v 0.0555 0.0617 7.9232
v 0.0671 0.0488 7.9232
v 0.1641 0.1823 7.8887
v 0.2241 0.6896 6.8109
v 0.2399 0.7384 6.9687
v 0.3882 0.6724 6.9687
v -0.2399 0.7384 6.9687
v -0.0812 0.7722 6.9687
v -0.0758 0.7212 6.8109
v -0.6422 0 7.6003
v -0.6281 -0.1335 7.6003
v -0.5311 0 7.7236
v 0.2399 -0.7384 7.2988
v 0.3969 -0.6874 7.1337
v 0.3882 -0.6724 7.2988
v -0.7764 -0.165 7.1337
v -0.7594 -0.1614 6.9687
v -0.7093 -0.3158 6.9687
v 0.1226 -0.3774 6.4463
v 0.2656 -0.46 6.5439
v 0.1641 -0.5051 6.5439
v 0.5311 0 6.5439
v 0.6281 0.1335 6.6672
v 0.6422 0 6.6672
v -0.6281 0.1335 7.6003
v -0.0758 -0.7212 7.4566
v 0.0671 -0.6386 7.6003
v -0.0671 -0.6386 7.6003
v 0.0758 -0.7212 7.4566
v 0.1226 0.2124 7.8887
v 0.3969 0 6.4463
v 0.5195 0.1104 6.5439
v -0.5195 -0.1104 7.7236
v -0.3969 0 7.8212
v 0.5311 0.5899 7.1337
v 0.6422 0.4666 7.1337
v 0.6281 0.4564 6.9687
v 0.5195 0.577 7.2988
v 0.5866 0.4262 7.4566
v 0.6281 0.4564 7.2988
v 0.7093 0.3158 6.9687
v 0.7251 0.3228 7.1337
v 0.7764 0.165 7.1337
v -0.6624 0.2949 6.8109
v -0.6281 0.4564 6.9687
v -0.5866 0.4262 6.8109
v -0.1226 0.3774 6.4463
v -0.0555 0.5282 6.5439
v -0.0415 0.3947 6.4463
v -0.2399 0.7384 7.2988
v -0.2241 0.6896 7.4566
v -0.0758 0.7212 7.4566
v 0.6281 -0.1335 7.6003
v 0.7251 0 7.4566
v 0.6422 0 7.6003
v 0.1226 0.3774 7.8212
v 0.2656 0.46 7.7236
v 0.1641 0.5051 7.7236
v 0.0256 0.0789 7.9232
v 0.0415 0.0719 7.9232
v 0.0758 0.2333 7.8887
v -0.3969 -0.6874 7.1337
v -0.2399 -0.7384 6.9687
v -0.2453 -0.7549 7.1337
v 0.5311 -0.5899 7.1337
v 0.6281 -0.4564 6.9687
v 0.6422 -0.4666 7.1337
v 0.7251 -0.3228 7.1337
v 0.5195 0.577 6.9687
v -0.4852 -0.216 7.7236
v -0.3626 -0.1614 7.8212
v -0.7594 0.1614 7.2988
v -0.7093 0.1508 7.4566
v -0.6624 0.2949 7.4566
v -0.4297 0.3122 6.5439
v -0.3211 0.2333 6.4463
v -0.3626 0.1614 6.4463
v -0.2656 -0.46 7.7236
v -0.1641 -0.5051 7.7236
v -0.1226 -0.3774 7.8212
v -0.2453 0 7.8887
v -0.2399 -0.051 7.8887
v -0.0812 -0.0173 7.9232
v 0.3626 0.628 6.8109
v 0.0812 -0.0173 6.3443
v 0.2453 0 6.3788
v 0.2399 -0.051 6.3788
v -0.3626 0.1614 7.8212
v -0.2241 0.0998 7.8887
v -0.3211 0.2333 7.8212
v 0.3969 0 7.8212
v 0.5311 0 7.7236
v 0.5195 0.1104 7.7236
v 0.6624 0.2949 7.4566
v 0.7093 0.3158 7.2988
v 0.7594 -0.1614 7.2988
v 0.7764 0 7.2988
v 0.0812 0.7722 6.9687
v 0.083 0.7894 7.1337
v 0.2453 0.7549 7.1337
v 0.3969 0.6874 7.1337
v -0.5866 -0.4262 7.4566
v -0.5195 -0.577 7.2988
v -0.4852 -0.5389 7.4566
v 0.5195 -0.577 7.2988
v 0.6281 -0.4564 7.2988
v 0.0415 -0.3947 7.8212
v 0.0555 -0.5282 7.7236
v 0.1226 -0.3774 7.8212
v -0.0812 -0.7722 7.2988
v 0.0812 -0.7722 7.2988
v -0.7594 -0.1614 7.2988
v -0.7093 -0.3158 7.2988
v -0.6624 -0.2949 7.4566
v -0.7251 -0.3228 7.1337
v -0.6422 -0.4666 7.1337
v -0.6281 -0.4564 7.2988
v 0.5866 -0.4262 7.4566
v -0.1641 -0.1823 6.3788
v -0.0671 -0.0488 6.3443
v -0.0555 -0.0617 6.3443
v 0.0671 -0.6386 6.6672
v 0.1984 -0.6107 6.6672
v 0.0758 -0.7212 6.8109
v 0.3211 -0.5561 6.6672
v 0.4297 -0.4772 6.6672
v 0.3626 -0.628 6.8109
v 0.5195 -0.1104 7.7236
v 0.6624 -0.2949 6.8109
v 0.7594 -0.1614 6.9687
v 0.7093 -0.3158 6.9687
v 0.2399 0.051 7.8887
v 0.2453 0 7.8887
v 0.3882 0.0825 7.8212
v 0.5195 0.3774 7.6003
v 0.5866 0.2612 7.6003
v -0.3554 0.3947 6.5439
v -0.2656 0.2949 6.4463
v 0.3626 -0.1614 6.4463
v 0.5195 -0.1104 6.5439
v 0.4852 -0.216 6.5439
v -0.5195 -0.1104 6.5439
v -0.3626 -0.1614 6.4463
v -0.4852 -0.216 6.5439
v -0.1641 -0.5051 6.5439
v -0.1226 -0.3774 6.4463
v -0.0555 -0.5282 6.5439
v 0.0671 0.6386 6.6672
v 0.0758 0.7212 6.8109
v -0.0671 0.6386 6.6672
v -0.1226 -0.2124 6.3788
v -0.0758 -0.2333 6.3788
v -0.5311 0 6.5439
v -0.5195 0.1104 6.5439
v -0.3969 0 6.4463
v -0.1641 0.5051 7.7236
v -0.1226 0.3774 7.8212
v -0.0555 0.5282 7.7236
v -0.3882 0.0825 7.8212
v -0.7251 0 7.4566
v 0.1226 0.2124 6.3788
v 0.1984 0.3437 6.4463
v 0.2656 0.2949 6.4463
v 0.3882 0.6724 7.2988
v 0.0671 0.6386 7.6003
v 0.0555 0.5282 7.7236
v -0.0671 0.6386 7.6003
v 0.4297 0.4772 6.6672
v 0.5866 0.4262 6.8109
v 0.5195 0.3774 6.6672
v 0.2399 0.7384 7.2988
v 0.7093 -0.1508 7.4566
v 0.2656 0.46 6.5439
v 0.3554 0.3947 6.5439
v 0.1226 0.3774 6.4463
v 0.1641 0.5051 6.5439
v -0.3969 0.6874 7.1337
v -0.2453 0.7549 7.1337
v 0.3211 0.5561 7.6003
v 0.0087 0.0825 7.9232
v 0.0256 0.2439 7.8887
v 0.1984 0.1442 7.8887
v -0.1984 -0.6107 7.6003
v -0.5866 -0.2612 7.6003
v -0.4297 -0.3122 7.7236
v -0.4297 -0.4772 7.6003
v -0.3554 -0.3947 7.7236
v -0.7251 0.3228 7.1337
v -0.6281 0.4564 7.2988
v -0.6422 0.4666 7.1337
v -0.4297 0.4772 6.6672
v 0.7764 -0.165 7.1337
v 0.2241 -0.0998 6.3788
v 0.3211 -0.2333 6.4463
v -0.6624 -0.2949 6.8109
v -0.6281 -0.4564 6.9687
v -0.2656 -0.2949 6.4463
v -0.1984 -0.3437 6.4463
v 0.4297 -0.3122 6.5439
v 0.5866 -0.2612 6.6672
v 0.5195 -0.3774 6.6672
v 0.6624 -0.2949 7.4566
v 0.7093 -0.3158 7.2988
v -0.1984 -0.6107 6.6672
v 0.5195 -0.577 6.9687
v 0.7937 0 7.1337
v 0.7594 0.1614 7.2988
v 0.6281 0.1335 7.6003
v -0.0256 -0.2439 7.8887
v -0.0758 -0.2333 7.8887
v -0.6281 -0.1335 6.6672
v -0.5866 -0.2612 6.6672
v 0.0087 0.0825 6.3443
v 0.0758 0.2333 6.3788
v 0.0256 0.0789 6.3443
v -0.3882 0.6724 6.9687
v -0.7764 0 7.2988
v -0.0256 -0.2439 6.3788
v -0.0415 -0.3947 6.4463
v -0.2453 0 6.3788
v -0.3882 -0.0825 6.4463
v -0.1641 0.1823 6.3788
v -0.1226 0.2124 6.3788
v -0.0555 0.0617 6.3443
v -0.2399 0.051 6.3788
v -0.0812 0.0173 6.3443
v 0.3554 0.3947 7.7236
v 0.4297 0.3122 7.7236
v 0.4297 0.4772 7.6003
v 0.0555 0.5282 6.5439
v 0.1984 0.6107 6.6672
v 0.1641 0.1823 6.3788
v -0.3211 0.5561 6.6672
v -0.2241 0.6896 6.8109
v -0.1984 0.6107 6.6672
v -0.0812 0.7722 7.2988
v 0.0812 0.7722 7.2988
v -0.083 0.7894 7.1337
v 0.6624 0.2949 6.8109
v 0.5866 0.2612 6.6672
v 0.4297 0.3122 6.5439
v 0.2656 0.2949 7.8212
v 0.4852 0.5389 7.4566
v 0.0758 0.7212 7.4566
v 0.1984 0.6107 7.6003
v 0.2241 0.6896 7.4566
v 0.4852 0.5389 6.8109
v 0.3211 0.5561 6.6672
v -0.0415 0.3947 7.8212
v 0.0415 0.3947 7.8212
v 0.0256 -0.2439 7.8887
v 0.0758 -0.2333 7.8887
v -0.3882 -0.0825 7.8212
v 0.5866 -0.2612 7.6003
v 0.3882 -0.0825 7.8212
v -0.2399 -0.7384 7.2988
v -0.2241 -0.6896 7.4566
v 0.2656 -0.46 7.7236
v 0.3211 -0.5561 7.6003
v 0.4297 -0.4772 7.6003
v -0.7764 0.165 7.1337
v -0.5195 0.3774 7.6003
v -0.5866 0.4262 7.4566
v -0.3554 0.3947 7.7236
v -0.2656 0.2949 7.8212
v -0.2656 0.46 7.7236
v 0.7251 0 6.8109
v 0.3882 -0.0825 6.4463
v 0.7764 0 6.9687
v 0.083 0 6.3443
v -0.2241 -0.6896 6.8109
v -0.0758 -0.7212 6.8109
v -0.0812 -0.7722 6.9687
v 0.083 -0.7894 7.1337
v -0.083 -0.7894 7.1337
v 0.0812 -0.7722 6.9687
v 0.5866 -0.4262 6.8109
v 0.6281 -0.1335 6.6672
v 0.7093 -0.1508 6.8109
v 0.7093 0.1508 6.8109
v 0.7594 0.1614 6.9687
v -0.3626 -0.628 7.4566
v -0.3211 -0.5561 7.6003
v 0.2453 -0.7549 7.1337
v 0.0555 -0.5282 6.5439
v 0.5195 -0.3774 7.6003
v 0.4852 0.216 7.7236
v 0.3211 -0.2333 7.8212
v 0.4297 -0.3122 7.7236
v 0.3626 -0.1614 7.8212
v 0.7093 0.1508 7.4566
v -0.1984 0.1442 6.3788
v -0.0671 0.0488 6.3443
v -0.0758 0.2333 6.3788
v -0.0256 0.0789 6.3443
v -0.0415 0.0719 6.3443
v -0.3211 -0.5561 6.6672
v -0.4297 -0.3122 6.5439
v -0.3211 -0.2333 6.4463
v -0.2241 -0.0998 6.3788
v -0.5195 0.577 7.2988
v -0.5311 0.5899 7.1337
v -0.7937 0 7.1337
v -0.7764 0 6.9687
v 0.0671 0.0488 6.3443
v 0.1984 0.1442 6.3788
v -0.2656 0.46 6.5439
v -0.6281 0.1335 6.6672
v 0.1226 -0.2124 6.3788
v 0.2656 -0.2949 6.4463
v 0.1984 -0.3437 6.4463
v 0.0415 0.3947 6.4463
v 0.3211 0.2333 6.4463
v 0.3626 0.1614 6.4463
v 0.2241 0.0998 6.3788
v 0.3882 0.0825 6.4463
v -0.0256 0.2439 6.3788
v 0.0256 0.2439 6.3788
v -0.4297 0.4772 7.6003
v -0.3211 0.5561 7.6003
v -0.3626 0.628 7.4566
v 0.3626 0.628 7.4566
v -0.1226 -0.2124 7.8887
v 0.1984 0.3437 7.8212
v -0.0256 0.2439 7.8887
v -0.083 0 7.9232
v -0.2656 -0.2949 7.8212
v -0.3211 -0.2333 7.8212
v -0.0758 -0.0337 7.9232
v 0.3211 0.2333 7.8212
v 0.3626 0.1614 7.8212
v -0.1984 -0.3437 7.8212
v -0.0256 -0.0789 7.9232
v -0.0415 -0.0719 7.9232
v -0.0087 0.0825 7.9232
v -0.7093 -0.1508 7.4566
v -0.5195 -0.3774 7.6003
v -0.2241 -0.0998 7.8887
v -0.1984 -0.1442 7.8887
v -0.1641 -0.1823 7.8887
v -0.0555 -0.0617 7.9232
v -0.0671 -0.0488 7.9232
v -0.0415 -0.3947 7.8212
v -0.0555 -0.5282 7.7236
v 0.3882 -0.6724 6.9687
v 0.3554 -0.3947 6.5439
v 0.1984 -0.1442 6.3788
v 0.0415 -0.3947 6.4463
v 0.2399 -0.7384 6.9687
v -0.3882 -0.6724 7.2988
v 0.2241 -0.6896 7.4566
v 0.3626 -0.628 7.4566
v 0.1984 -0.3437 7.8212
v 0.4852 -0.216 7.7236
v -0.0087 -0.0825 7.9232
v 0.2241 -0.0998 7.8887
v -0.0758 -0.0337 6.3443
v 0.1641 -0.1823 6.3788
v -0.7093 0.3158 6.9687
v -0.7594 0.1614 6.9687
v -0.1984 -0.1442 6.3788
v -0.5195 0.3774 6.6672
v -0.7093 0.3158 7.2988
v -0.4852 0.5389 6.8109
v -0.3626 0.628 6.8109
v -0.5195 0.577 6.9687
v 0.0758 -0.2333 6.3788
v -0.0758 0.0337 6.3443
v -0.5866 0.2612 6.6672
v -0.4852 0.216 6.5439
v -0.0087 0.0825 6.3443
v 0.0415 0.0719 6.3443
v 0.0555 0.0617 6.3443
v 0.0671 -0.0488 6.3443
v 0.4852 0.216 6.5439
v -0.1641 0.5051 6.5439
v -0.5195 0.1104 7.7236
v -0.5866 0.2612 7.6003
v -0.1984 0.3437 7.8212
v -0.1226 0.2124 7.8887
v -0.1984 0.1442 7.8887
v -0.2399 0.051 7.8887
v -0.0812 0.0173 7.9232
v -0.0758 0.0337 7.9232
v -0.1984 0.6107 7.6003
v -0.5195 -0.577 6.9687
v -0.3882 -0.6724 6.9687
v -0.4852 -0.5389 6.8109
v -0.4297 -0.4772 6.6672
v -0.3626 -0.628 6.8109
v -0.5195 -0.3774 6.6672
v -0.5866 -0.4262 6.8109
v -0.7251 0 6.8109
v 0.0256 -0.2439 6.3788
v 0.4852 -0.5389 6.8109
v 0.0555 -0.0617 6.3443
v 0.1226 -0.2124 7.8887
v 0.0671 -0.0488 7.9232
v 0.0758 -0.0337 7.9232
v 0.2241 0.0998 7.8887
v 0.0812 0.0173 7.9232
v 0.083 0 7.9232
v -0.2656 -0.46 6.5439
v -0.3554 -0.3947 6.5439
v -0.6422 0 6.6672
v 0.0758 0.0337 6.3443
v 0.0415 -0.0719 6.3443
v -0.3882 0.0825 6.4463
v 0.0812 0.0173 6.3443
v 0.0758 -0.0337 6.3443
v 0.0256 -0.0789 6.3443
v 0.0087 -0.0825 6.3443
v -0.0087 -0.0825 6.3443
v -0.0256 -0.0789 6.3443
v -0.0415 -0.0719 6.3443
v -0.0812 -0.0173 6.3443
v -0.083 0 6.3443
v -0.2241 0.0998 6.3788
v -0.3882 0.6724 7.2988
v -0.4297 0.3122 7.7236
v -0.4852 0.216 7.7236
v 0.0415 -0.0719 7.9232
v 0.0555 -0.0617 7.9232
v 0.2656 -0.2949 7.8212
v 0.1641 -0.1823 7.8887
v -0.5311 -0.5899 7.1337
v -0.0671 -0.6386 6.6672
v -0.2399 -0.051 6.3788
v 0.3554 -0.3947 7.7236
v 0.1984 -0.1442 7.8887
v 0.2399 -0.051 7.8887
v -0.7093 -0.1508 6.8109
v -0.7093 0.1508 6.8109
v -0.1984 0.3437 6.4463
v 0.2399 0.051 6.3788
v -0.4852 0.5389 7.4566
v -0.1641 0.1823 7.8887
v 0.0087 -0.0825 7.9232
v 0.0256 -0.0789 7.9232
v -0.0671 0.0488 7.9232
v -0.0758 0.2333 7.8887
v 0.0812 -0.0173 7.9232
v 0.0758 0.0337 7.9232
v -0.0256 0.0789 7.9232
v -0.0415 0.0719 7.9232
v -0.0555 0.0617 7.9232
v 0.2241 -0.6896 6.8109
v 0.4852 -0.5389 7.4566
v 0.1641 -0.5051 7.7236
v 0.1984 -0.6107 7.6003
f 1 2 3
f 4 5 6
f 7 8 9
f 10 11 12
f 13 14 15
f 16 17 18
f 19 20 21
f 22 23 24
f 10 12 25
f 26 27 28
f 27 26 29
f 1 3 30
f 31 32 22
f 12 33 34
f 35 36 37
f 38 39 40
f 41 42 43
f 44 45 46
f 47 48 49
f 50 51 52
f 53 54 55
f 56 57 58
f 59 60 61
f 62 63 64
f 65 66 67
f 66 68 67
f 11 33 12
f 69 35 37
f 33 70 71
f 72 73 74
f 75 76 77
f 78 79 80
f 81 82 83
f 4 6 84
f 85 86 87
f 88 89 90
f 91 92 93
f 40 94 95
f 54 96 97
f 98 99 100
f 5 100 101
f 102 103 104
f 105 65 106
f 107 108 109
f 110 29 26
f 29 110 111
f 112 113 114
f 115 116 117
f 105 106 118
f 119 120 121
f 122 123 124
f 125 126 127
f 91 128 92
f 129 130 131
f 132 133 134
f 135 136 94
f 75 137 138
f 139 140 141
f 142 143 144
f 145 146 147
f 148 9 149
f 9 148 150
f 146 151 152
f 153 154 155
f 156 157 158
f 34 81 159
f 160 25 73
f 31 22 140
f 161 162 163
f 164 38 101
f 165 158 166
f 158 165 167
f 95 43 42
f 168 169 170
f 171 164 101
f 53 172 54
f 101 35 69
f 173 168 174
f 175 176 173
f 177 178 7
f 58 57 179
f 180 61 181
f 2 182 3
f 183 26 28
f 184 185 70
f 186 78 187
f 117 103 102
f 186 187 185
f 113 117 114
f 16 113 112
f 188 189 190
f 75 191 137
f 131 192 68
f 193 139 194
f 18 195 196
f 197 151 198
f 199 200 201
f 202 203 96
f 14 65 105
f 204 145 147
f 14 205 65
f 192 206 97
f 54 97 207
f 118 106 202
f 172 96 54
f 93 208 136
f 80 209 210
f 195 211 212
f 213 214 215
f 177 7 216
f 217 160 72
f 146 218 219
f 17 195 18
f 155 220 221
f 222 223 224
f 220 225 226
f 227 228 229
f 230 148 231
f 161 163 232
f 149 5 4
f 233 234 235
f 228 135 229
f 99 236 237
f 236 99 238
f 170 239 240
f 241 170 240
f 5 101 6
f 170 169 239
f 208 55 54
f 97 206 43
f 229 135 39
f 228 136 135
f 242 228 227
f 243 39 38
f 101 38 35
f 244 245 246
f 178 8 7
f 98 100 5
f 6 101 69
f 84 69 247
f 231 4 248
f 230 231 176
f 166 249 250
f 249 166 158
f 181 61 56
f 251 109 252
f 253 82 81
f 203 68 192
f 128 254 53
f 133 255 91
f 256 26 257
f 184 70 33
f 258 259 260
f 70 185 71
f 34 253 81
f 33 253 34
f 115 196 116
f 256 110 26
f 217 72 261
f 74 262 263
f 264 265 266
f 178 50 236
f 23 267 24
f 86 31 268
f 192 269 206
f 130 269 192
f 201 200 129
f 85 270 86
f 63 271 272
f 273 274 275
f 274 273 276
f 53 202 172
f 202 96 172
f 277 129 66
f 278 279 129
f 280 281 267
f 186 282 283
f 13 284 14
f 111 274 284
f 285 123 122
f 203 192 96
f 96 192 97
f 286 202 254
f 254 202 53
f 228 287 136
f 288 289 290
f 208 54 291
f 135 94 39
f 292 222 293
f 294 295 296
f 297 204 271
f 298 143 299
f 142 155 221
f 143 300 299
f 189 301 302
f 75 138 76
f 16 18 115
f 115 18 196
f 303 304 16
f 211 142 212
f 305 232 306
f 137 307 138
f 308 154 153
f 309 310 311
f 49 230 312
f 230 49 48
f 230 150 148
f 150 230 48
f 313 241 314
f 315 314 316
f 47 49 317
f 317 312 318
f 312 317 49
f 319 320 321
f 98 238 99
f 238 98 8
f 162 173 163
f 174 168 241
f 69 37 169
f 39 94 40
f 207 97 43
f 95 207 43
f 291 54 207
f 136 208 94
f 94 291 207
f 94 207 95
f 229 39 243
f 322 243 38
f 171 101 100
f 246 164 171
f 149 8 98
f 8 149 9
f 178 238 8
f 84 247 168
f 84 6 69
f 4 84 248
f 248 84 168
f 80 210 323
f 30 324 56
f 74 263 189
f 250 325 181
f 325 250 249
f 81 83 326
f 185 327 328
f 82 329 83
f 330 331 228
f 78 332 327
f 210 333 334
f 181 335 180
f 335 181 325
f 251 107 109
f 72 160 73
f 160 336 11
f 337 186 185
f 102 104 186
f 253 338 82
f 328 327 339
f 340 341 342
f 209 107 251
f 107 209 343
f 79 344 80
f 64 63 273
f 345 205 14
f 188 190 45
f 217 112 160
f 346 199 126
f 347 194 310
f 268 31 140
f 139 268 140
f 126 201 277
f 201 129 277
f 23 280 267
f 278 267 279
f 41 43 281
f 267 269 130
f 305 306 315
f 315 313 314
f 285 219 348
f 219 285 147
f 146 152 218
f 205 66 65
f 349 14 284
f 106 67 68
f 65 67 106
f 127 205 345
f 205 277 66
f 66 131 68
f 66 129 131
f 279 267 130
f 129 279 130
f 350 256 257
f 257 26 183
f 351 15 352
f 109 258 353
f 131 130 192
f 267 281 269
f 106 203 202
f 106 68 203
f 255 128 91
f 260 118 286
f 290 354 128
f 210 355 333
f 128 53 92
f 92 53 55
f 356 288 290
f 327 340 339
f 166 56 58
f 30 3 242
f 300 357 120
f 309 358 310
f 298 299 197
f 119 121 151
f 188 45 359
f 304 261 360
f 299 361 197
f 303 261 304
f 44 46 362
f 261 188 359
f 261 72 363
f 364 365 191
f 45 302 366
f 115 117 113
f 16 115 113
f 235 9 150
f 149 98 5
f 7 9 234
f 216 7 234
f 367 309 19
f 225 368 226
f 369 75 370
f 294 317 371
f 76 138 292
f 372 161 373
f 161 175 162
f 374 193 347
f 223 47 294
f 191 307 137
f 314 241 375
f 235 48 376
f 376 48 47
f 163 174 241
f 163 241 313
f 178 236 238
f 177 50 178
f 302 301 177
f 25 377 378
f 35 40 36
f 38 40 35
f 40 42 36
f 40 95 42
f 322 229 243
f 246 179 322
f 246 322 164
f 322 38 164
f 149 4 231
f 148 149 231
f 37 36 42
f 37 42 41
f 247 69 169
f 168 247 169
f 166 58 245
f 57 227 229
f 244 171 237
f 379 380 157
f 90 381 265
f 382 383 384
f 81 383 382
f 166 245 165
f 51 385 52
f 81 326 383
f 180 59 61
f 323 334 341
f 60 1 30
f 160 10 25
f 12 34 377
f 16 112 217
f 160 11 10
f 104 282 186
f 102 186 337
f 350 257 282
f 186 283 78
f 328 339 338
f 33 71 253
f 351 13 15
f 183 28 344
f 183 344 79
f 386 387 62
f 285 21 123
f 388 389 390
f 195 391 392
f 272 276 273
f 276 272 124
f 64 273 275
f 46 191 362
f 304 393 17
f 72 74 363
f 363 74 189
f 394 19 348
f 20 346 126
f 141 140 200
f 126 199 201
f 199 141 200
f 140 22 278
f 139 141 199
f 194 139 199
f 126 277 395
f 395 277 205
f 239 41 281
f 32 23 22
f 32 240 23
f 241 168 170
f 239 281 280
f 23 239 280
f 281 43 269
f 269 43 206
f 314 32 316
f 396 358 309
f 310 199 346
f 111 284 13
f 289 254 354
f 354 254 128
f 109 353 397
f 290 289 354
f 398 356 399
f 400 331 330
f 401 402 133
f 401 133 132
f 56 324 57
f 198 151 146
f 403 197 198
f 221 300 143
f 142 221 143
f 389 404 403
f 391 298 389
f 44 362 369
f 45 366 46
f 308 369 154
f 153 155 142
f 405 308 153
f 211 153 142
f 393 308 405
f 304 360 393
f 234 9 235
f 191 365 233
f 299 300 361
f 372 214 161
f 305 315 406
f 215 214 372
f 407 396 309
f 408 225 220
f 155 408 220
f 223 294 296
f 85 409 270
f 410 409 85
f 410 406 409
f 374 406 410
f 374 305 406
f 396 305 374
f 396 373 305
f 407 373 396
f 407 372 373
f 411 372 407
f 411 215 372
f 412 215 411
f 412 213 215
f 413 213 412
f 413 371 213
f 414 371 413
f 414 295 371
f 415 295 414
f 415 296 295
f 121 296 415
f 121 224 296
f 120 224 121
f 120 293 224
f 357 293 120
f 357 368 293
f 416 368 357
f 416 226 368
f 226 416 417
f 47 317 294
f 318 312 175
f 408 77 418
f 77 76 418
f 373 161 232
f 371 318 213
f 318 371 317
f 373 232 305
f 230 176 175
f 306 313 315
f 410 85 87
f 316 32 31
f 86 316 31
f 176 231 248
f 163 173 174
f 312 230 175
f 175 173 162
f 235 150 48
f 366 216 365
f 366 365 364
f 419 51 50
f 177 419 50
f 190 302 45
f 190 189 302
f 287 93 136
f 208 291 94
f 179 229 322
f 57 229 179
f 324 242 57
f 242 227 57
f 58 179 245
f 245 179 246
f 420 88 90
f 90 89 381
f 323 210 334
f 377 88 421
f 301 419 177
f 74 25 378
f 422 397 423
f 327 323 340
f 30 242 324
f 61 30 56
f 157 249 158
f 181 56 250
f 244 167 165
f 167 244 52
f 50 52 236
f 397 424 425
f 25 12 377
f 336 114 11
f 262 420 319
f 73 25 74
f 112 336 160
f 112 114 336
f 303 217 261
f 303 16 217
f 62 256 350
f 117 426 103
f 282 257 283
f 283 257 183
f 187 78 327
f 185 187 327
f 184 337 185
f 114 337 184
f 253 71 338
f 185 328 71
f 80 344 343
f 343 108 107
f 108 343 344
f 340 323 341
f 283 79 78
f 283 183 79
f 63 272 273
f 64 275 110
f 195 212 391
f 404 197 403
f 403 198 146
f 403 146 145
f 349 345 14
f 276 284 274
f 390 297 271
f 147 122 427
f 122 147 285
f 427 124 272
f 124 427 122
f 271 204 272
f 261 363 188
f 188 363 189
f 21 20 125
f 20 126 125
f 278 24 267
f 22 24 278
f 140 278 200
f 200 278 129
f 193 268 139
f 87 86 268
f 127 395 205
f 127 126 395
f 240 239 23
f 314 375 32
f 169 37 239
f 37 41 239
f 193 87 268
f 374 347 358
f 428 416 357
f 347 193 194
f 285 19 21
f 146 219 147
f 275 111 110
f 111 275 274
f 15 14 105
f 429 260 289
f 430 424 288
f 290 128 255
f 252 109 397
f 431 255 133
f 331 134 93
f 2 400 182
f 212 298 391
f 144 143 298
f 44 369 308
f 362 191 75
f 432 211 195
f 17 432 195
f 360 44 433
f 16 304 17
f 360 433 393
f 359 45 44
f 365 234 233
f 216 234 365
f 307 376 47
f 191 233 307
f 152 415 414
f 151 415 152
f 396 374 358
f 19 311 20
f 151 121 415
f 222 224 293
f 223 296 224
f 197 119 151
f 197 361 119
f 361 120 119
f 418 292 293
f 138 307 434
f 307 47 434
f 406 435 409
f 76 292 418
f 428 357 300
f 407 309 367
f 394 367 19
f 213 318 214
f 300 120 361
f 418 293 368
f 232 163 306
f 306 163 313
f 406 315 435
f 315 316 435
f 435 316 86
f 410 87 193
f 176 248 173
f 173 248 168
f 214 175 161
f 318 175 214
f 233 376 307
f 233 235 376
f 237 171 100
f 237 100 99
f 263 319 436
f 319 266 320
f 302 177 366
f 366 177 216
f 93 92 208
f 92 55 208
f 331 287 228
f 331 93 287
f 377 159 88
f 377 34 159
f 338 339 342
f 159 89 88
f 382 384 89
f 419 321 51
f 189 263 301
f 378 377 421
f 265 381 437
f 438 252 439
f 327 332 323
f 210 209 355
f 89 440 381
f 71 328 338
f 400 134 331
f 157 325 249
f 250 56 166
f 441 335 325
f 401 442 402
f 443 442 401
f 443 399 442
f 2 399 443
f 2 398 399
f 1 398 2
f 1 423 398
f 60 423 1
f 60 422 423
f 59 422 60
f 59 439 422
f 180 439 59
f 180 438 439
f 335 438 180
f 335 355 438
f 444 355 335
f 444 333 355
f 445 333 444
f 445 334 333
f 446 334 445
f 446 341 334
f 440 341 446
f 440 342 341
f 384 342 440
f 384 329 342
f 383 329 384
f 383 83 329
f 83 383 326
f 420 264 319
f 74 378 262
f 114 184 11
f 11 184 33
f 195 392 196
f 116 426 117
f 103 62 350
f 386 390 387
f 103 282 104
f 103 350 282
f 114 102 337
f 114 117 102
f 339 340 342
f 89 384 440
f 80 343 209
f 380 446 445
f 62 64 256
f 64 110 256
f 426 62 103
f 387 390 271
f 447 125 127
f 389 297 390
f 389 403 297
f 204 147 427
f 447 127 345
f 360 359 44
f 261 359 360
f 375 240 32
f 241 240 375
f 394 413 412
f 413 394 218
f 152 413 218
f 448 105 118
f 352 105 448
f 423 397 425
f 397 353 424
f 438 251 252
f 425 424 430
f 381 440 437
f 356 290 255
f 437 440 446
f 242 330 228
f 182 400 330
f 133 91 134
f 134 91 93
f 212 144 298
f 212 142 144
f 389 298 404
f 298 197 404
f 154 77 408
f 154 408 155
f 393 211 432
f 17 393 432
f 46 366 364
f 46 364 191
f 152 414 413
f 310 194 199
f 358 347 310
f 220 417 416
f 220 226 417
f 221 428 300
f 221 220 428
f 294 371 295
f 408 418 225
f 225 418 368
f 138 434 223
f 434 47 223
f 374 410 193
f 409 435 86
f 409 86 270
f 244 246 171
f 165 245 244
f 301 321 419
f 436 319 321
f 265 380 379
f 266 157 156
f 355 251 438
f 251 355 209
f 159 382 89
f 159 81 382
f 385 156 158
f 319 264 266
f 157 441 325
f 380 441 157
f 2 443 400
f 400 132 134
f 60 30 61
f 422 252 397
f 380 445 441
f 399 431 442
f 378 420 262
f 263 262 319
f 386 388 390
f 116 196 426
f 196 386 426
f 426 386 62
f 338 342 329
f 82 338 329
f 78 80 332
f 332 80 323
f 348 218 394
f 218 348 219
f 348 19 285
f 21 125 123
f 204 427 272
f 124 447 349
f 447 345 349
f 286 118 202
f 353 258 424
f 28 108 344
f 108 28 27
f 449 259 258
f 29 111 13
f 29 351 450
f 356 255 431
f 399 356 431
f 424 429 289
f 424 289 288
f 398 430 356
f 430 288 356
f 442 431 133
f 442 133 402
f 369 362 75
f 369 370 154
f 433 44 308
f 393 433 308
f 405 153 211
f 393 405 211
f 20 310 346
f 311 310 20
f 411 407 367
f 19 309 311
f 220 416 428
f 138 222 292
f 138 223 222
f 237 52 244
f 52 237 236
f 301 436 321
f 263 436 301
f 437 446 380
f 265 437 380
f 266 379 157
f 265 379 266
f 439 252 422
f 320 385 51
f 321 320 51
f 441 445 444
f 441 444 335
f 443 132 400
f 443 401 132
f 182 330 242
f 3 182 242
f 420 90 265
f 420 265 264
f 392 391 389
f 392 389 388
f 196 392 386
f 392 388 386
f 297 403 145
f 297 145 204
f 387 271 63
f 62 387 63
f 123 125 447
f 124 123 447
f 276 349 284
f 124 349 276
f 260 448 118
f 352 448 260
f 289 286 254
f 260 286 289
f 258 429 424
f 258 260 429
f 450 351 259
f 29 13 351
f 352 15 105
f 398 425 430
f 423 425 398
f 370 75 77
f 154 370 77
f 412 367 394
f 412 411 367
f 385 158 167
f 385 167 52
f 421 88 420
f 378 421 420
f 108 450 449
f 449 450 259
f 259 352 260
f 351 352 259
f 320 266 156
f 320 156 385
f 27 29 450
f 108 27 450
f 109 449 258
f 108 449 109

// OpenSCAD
// 3D print version of MCP.

// Accepts a modified 33mm square arcade button for
// CAUTION/WARNING indicator.

// Original file is a DXF for laser cutting of three
// layers:
// Panel: 1.5 or 1.6mm (1/16") acrylic
// Fascia: two layers of 3mm (1/8") MDF
// These are stacked and screwed together, then primed
// and painted.

// The 3D model is based on the final stacked assembly.
// Takes several minutes to render due to the Minkowski
// operation to make the rounded top edges.

function to_mm(in) = in * 25.4;

module panel() {
  linear_extrude(height = to_mm(1/16), convexity = 10, $fn = 30)
  import("master_caution_panel_33mm.dxf", layer = "panel");
 }
 
module fascia() {
  linear_extrude(height = to_mm((1/4)-(1/32)), convexity = 10, $fn = 30)
  import("master_caution_panel_33mm.dxf", layer = "fascia_outline");
  
  // The top slice is made with a minkowski sum to
  // round off the top edges. The 'lower' rounded
  // part is lost inside the bulk extrusion from above.
  translate([0, 0, to_mm((1/4) - (1/32)) - 0.01])
  minkowski() {
    sphere(r = to_mm(1/32), $fn = 30);
    linear_extrude(height = 0.01, convexity = 10, $fn = 30)
    offset(r = -to_mm(1/32))
    import("master_caution_panel_33mm.dxf", layer = "fascia_outline");
  }
}

difference() {
  // Build the panel and the fascia as one block.
  union() {
    panel();
    translate([0, 0, to_mm(1/16)])
    fascia();
  }

  // Remove the hole in fascia, step up by the thickness
  // of the panel, plus 1mm so that the switch does
  // not sit too far below the face of the fascia.
  // Expand the hole by 0.2mm.
  translate([0, 0, to_mm(1/16) + 1])
  linear_extrude(height = to_mm(1/4), convexity = 10, $fa=0.5, $fs=0.2, $fn = 60)
  offset(r = 0.2)
  import("master_caution_panel_33mm.dxf", layer = "fascia_cut");
  
  // Remove the hole in the panel.
  // Expand the hole by 0.2mm.
  linear_extrude(height = to_mm(1/4), convexity = 10, $fn = 60)
  offset(r = 0.2)
  import("master_caution_panel_33mm.dxf", layer = "panel_cut");

  // The holes that are used to fasten the fascia and
  // panel together will be present, but only two are
  // used, for the connector PCB bracket.
  linear_extrude(height = to_mm(1/4), convexity = 10, $fn = 60)
  import("master_caution_panel_33mm.dxf", layer = "fasteners_fascia");

}
